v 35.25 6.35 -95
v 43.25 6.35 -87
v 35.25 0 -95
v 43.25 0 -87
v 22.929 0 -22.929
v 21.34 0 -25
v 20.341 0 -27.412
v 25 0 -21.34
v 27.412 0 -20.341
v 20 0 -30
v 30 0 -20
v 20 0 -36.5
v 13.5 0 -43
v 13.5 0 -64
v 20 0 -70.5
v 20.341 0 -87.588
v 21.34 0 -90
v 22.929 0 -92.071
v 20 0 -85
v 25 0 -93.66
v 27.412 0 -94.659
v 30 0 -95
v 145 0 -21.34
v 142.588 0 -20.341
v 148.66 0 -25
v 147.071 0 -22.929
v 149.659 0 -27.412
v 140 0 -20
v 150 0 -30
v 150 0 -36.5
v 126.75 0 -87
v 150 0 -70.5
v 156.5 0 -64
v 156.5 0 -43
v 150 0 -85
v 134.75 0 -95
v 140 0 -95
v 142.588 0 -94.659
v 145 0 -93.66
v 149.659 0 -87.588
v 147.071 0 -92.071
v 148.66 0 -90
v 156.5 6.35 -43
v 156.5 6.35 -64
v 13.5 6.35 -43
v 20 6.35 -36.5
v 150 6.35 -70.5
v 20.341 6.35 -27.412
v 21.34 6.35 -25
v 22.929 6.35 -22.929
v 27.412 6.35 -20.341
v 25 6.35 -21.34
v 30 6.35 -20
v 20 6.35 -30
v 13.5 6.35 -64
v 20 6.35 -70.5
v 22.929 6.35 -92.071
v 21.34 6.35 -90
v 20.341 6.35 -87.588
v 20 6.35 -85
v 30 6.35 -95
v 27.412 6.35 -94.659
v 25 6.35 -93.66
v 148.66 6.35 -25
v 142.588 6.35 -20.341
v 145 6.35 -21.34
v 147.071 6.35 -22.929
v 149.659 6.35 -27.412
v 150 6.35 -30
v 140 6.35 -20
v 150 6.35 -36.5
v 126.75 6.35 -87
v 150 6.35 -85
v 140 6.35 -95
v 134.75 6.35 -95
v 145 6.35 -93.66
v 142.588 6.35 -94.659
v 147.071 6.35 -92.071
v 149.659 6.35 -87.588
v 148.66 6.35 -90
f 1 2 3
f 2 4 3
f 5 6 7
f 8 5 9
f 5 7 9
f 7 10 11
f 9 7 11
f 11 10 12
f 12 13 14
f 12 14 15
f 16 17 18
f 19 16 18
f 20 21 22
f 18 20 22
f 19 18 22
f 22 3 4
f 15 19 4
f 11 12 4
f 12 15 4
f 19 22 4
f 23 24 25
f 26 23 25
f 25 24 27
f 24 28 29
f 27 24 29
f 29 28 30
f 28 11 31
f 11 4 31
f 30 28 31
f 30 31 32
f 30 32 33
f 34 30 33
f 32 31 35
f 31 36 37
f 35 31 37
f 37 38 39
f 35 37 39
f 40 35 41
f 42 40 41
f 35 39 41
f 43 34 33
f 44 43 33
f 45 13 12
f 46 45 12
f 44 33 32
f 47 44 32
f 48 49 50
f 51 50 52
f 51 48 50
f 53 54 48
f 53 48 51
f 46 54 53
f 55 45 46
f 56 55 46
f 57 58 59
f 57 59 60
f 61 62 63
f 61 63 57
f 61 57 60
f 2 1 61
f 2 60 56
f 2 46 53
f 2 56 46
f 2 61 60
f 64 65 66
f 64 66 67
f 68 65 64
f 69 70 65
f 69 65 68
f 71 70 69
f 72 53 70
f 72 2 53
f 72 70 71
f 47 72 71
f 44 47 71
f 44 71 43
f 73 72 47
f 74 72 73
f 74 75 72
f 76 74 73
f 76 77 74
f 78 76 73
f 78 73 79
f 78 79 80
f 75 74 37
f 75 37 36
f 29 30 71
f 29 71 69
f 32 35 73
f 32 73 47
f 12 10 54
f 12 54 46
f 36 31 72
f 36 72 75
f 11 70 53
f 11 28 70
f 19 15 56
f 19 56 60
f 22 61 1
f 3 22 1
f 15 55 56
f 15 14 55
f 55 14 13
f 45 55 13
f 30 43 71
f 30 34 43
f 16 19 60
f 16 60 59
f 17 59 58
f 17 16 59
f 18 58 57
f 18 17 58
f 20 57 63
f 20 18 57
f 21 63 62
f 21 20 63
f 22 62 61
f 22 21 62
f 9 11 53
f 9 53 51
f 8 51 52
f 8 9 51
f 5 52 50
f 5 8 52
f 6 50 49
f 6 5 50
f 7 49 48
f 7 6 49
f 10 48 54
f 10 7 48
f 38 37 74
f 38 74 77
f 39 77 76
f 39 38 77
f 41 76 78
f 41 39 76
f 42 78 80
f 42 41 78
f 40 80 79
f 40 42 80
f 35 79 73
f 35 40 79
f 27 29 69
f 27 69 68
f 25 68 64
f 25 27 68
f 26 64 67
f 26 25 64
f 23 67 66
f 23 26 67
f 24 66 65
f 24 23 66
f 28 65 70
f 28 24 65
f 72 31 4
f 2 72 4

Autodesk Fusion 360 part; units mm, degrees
sketch "Sketch1" plane through (0, 0, 0) normal (0, 1, 0) x (1, 0, 0)
  line L0 (0, 0) -> (170, 0)
  line L1 (170, 0) -> (170, 170)
  line L2 (170, 170) -> (0, 170)
  line L3 (0, 170) -> (0, 0)
  line L4 (85, 170) -> (85, 128.5) construction
  line L5 (110, 107) -> (60, 107)
  line L6 (50, 117) -> (50, 140)
  line L7 (60, 150) -> (110, 150)
  line L8 (120, 140) -> (120, 117)
  line L9 (120, 107) -> (50, 150) construction
  line L10 (50, 107) -> (120, 150) construction
  arc A0 (60, 150) -> (50, 140) centre (60, 140) ccw
  arc A1 (120, 140) -> (110, 150) centre (110, 140) ccw
  arc A2 (110, 107) -> (120, 117) centre (110, 117) ccw
  arc A3 (50, 117) -> (60, 107) centre (60, 117) ccw
  line L11 (85, 128.5) -> (0, 128.5) construction
  line L12 (85, 128.5) -> (170, 128.5) construction
  arc A4 (0, 108.5) -> (0, 148.5) centre (0, 128.5) ccw
  arc A5 (170, 148.5) -> (170, 108.5) centre (170, 128.5) ccw
  line L13 (85, 0) -> (85, 53.5) construction
  line L14 (140, 20) -> (30, 20)
  line L15 (20, 30) -> (20, 87)
  line L16 (150, 87) -> (150, 30)
  line L17 (150, 20) -> (20, 87) construction
  line L18 (20, 20) -> (150, 87) construction
  arc A6 (20, 30) -> (30, 20) centre (30, 30) ccw
  arc A7 (140, 20) -> (150, 30) centre (140, 30) ccw
  line L19 (85, 53.5) -> (20, 53.5) construction
  line L20 (85, 53.5) -> (150, 53.5) construction
  line L21 (20, 53.5) -> (13.5, 53.5) construction
  line L22 (13.5, 53.5) -> (13.5, 64)
  line L23 (13.5, 53.5) -> (13.5, 43)
  line L24 (13.5, 43) -> (13.5, 36.5) construction
  line L25 (13.5, 36.5) -> (20, 36.5) construction
  line L26 (13.5, 64) -> (13.5, 70.5) construction
  line L27 (13.5, 70.5) -> (20, 70.5) construction
  line L28 (13.5, 64) -> (20, 70.5)
  line L29 (13.5, 43) -> (20, 36.5)
  line L30 (156.5, 64) -> (150, 70.5)
  line L31 (156.5, 53.5) -> (156.5, 64)
  line L32 (156.5, 53.5) -> (156.5, 43)
  line L33 (156.5, 43) -> (150, 36.5)
  line L34 (85, 53.5) -> (85, 87) construction
  line L35 (85, 128.5) -> (85, 87) construction
  line L36 (85, 87) -> (43.25, 87)
  line L37 (43.25, 87) -> (35.25, 95)
  line L38 (30, 95) -> (35.25, 95)
  line L39 (35.25, 95) -> (35.25, 87) construction
  line L40 (35.25, 87) -> (43.25, 87) construction
  line L41 (30, 95) -> (30, 85) construction
  arc A8 (30, 95) -> (20, 85) centre (30, 85) ccw
  line L42 (30, 85) -> (30, 95) construction
  line L43 (30, 85) -> (20, 85) construction
  arc A9 (150, 85) -> (140, 95) centre (140, 85) ccw
  line L44 (140, 95) -> (134.75, 95)
  line L45 (126.75, 87) -> (134.75, 95)
  line L46 (85, 87) -> (126.75, 87)
  point P0 (85, 128.5)
  point P1 (85, 53.5)
  dimension "d1" = 170
  dimension "d2" = 170
  dimension "d19" = 41.5
  dimension "d20" = 70
  dimension "d21" = 43
  dimension "d22" = 10
  dimension "d23" = 10
  dimension "d24" = 10
  dimension "d25" = 10
  dimension "d26" = 20
  dimension "d27" = 20
  dimension "d28" = 53.5
  dimension "d29" = 130
  dimension "d30" = 67
  dimension "d31" = 10
  dimension "d32" = 10
  dimension "d33" = 6.5
  dimension "d34" = 10.5
  dimension "d35" = 10.5
  dimension "d36" = 6.5
  dimension "d37" = 6.5
  dimension "d41" = 41.5
  dimension "d42" = 33.5
  dimension "d44" = 41.75
  dimension "d48" = 5.25
  dimension "d49" = 135
  dimension "d50" = 8
  dimension "d51" = 10
  dimension "d52" = 90
  dimension "d53" = 135
  dimension "d54" = 8
extrude "Extrude1" add sketch "Sketch1" along normal blind 6.35 contours L14 L15 L16 A6 A7 L36 L37 L38 A8 A9 L44 L45 L46 | L16 L30 L31 L32 L33 | L15 L22 L23 L28 L29
